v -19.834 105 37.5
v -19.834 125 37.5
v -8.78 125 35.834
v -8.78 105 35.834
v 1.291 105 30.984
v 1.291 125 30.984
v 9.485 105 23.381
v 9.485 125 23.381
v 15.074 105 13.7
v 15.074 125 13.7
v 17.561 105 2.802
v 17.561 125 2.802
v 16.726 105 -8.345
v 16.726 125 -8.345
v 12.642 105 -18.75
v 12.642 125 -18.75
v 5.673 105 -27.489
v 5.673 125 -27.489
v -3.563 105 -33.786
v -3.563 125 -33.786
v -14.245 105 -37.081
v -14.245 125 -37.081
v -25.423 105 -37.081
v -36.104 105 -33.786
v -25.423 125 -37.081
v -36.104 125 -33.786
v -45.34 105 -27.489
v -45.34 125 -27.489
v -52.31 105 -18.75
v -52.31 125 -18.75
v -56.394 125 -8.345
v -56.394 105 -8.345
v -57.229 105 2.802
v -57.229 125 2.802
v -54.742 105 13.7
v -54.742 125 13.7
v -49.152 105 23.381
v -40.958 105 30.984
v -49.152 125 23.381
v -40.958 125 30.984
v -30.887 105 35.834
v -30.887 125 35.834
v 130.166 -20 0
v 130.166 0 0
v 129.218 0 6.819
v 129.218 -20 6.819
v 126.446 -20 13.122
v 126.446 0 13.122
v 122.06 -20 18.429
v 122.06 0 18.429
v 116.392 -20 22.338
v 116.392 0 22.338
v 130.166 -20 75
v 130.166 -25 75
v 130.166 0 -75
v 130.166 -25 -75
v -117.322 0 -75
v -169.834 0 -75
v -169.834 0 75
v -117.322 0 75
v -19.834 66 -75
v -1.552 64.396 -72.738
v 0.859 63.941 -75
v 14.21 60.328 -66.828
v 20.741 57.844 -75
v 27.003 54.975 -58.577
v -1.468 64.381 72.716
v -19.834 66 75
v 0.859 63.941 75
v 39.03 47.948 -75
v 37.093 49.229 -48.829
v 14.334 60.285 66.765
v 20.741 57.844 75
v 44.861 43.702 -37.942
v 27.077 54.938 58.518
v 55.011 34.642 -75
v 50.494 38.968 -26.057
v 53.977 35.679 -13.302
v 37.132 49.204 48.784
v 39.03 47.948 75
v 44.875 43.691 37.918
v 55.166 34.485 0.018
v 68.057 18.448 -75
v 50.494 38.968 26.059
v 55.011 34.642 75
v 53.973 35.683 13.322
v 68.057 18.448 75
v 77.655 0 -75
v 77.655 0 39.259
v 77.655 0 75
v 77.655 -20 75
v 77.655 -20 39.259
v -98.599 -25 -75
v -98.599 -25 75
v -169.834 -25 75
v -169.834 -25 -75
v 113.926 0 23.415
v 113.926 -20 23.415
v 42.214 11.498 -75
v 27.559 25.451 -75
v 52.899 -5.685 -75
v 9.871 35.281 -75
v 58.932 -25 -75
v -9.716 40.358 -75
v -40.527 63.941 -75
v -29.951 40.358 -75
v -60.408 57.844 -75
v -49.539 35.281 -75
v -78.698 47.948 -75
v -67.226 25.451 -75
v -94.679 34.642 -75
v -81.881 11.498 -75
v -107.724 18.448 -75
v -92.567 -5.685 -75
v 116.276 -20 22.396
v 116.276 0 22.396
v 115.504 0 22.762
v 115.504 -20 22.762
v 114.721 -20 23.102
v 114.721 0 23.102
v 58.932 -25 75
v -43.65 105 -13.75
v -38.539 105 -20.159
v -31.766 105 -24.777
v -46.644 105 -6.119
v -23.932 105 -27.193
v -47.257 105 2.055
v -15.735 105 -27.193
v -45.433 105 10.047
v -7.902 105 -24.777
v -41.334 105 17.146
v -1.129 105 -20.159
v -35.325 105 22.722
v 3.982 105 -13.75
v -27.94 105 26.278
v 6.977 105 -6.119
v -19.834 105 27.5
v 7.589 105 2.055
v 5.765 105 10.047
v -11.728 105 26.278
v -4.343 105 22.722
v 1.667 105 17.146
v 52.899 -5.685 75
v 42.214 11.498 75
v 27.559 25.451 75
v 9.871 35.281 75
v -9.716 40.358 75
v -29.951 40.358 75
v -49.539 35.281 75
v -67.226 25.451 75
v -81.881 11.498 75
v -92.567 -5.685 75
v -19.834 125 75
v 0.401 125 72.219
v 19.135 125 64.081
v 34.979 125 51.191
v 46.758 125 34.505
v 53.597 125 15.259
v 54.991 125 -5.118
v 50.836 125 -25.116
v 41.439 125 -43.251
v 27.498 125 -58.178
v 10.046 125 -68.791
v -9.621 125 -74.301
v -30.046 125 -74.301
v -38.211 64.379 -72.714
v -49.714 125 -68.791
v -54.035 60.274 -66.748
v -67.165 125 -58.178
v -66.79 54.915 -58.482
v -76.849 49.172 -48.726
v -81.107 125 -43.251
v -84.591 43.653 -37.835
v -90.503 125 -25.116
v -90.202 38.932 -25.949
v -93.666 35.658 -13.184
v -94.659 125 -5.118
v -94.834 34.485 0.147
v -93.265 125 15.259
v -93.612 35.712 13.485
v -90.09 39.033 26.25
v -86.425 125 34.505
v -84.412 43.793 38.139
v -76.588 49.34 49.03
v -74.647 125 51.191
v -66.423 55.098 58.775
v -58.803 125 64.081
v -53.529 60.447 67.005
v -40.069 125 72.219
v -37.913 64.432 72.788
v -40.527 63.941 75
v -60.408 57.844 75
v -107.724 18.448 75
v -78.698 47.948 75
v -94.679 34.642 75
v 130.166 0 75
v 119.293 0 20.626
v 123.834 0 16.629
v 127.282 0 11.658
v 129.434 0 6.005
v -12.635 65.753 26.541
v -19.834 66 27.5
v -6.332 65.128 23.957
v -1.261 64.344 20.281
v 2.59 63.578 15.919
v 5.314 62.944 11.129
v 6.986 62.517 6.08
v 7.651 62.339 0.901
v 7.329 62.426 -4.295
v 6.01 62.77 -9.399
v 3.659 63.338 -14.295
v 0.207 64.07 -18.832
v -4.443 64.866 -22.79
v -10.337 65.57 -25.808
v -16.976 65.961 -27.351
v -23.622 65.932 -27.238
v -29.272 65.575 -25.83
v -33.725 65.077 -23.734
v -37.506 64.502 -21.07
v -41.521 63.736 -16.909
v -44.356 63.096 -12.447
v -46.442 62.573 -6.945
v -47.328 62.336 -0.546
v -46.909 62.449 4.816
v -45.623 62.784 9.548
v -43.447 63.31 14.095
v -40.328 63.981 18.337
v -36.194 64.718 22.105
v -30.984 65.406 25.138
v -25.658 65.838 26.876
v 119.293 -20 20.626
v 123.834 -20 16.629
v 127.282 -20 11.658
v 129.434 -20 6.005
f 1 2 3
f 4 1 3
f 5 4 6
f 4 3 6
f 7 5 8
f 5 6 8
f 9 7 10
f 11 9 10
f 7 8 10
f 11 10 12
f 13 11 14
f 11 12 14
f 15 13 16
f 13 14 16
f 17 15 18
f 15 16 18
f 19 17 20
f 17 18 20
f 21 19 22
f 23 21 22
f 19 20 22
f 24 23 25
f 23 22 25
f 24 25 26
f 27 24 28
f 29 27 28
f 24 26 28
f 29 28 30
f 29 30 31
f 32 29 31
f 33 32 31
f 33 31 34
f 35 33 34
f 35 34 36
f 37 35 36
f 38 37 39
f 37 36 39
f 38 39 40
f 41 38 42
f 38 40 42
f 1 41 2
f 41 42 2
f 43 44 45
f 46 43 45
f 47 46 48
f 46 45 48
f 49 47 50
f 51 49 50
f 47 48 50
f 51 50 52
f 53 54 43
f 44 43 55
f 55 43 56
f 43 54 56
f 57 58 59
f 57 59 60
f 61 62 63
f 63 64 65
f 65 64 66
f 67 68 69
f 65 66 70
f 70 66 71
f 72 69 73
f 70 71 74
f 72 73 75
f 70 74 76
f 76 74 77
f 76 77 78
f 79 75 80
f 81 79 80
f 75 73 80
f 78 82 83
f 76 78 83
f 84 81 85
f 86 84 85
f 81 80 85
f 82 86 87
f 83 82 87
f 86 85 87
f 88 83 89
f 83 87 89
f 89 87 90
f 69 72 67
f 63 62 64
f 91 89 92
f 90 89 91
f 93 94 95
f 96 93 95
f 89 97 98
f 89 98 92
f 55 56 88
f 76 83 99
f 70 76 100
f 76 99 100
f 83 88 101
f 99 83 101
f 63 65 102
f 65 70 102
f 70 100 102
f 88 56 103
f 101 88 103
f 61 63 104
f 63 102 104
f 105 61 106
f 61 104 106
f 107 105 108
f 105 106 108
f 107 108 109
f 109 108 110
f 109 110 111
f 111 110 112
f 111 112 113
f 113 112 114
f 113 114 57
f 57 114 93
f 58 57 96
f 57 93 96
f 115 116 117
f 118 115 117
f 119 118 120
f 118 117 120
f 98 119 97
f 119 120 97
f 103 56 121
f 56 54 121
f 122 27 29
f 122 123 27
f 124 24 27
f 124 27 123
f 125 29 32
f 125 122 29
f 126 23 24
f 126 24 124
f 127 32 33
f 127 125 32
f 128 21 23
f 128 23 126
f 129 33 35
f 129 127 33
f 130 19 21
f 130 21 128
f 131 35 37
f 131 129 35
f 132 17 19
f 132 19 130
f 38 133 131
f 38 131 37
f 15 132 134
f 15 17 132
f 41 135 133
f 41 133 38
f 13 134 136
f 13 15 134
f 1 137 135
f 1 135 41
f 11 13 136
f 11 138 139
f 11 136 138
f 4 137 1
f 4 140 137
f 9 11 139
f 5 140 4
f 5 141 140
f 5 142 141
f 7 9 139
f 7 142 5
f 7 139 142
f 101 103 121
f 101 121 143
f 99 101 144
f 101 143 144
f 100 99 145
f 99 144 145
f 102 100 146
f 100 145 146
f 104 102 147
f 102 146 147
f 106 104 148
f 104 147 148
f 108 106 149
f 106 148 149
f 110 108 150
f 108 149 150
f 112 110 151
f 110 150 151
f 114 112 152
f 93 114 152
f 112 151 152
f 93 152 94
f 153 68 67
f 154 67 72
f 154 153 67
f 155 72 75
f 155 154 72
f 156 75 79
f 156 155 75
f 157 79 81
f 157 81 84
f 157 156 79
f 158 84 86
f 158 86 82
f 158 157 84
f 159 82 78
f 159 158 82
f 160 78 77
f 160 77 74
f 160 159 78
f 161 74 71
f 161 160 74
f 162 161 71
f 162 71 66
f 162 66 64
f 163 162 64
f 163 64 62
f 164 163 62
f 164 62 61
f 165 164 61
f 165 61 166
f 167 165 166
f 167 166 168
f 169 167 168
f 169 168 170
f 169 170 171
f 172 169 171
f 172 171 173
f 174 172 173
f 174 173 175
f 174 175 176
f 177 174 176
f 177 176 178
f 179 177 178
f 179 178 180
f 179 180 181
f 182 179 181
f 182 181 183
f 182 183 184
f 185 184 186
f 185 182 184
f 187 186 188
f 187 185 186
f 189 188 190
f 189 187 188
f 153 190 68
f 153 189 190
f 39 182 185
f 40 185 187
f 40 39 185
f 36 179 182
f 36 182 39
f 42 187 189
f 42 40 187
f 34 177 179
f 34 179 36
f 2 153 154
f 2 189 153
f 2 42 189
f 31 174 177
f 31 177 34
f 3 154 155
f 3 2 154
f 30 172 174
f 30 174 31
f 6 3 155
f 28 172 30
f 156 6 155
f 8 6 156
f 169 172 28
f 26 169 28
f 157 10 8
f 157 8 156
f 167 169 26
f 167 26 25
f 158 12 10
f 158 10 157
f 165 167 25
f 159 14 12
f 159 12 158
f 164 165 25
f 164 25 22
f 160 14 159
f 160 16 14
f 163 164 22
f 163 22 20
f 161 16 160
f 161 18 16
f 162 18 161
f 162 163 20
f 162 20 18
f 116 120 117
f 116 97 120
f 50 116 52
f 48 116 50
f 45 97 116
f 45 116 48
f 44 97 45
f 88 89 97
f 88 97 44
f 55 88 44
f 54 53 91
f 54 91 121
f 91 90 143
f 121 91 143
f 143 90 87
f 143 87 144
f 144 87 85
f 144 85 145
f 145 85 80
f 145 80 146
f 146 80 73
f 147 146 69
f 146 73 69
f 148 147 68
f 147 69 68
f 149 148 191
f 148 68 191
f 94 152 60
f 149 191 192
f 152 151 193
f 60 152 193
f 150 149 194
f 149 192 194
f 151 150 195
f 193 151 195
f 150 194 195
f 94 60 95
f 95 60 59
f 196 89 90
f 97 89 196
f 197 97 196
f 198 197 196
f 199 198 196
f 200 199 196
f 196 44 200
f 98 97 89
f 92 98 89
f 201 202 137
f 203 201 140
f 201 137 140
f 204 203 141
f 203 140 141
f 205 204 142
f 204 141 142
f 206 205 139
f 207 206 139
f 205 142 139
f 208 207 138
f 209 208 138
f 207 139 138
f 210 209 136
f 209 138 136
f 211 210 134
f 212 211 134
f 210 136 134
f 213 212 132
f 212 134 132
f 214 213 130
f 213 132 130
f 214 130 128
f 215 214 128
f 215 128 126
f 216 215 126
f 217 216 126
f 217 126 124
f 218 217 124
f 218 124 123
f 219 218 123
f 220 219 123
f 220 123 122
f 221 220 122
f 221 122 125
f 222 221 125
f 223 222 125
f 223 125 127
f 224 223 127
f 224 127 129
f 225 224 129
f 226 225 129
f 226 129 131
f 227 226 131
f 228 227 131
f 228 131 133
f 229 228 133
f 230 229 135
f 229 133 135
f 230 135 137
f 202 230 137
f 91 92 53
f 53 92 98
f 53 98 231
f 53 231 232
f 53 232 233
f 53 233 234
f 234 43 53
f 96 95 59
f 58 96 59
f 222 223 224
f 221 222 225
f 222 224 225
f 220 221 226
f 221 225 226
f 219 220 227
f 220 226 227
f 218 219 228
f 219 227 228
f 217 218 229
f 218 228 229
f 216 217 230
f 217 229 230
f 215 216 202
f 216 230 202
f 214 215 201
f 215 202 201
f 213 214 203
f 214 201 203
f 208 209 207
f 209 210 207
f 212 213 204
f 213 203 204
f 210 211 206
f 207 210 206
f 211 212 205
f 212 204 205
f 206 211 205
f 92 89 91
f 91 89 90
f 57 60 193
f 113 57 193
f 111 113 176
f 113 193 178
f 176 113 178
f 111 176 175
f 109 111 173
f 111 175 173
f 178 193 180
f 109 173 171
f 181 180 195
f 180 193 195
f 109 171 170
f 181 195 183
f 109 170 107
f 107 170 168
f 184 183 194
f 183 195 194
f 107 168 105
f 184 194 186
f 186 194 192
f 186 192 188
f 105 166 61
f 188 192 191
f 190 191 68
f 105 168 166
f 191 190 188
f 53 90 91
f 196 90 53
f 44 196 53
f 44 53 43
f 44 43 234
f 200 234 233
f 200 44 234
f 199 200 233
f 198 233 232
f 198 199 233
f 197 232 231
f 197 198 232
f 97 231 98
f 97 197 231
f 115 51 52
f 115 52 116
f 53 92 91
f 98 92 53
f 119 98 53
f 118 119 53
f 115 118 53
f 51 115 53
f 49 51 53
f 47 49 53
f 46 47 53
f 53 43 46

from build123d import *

# Parameters (mm, degrees)
BOSS_EXTRUDE2_DEPTH      = 75
BOSS_EXTRUDE5_REACH      = 240.681
BOSS_EXTRUDE5_END_RADIUS = 105
SKETCH2_R                = 75
SKETCH2_R_2              = 37.5
BOSS_EXTRUDE6_REACH      = 240.681
BOSS_EXTRUDE6_END_RADIUS = 105
SKETCH2_10_R             = 37.5
SKETCH2_10_R_2           = 27.5
SKETCH2_11_R             = 37.5
SKETCH2_11_R_2           = 27.5
CUT_EXTRUDE1_DEPTH       = 20
CUT_EXTRUDE5_DEPTH       = 20
BOSS_EXTRUDE7_DEPTH      = 20
BOSS_EXTRUDE8_DEPTH      = 20


with BuildPart() as part:
    # Sketch1 → Boss-Extrude2 (new, symmetric)
    with BuildSketch(Plane.XY):
        with BuildLine():
            Line((-169.833817009, 0), (-117.322277864, 0))
            ThreePointArc((-117.322277864, 0), (-19.833817009, 66), (77.654643847, 0))
            Line((77.654643847, 0), (130.166182991, 0))
            Line((130.166182991, 0), (130.166182991, -25))
            Line((130.166182991, -25), (58.931657662, -25))
            ThreePointArc((58.931657662, -25), (-19.833817009, 41), (-98.599291679, -25))
            Line((-98.599291679, -25), (-169.833817009, -25))
            Line((-169.833817009, -25), (-169.833817009, 0))
        make_face()
    extrude(amount=BOSS_EXTRUDE2_DEPTH, both=True)

    # Boss-Extrude5: up to this cylinder (the profile starts outside it)
    boss_extrude5_end = Plane(origin=(-19.833817009, -39, -72.87868), z_dir=(0, 0, -1)) * Cylinder(BOSS_EXTRUDE5_END_RADIUS, 692.362, mode=Mode.PRIVATE)
    # Sketch2 → Boss-Extrude5 (add, up to the surface)
    with BuildSketch(Plane(origin=(0, 125, 0), x_dir=(1, 0, 0), z_dir=(0, 1, 0)), mode=Mode.PRIVATE) as boss_extrude5_sk1:
        with Locations(Location((-19.833817009, 0, 0), (0, 0, 270))):
            Circle(SKETCH2_R)
        with Locations(Location((-19.833817009, 0, 0), (0, 0, 270))):
            Circle(SKETCH2_R_2, mode=Mode.SUBTRACT)
    boss_extrude5_tool1 = extrude(boss_extrude5_sk1.sketch, amount=-BOSS_EXTRUDE5_REACH, mode=Mode.PRIVATE) - boss_extrude5_end
    add(boss_extrude5_tool1.solids().sort_by_distance((-19.833817, 125, -72.87868))[0])

    # Boss-Extrude6: up to this cylinder (the profile starts outside it)
    boss_extrude6_end = Plane(origin=(-19.833817009, -39, 0), z_dir=(0, 0, -1)) * Cylinder(BOSS_EXTRUDE6_END_RADIUS, 692.362, mode=Mode.PRIVATE)
    # Sketch2<10> → Boss-Extrude6 (add, up to the surface)
    with BuildSketch(Plane(origin=(0, 125, 0), x_dir=(1, 0, 0), z_dir=(0, 1, 0)), mode=Mode.PRIVATE) as boss_extrude6_sk1:
        with Locations((-19.833817009, 0)):
            Circle(SKETCH2_10_R)
        with Locations(Location((-19.833817009, 0, 0), (0, 0, 270))):
            Circle(SKETCH2_10_R_2, mode=Mode.SUBTRACT)
    boss_extrude6_tool1 = extrude(boss_extrude6_sk1.sketch, amount=-BOSS_EXTRUDE6_REACH, mode=Mode.PRIVATE) - boss_extrude6_end
    add(boss_extrude6_tool1.solids().sort_by_distance((-56.273157, 125, 0))[0])

    # Sketch2<11> → Cut-Extrude1 (cut)
    with BuildSketch(Plane(origin=(0, 125, 0), x_dir=(1, 0, 0), z_dir=(0, 1, 0))):
        with Locations(Location((-19.833817009, 0, 0), (0, 0, 270))):
            Circle(SKETCH2_11_R)
        with Locations(Location((-19.833817009, 0, 0), (0, 0, 270))):
            Circle(SKETCH2_11_R_2, mode=Mode.SUBTRACT)
    extrude(amount=-CUT_EXTRUDE1_DEPTH, mode=Mode.SUBTRACT)

    # Sketch3 → Cut-Extrude5 (cut)
    with BuildSketch(Plane(origin=(0, 0, 0), x_dir=(1, 0, 0), z_dir=(0, 1, 0))):
        with BuildLine():
            Line((77.654643847, -75), (130.166182991, -75))
            Line((130.166182991, -75), (130.166182991, 0))
            ThreePointArc((130.166182991, 0), (126.445873921, -13.121537789), (116.392202675, -22.337781494))
            Line((116.392202675, -22.337781494), (116.276169616, -22.395718278))
            ThreePointArc((116.276169616, -22.395718278), (115.113974639, -22.935593329), (113.925642242, -23.415206034))
            Line((113.925642242, -23.415206034), (77.654643847, -39.258833162))
            Line((77.654643847, -39.258833162), (77.654643847, -75))
        make_face()
        with BuildLine():
            ThreePointArc((113.873176653, 23.434766083), (125.692688314, 14.271039879), (130.166182991, 0))
            Line((130.166182991, 0), (130.166182991, 75))
            Line((130.166182991, 75), (77.654643847, 75))
            Line((77.654643847, 75), (77.654643847, 39.207200347))
            Line((77.654643847, 39.207200347), (113.873176653, 23.434766083))
        make_face()
    extrude(amount=-CUT_EXTRUDE5_DEPTH, mode=Mode.SUBTRACT)

    # Sketch4 → Boss-Extrude7 (add)
    with BuildSketch(Plane(origin=(0, -20, 0), x_dir=(1, 0, 0), z_dir=(0, 1, 0))):
        with BuildLine():
            Line((77.654643847, 75), (77.654643847, 39.207200347))
            Line((77.654643847, 39.207200347), (113.873176653, 23.434766083))
            ThreePointArc((113.873176653, 23.434766083), (125.341873235, 14.027135917), (130.166182991, 0))
            Line((130.166182991, 0), (130.166182991, 75))
            Line((130.166182991, 75), (77.654643847, 75))
        make_face()
    extrude(amount=BOSS_EXTRUDE7_DEPTH)


with BuildPart() as body_2:
    # Sketch5 → Boss-Extrude8 (new body)
    with BuildSketch(Plane(origin=(0, 0, 0), x_dir=(1, 0, 0), z_dir=(0, 1, 0))):
        with BuildLine():
            Line((77.654643847, -39.258833162), (77.654643847, -75))
            Line((77.654643847, -75), (130.166182991, -75))
            Line((130.166182991, -75), (130.166182991, 0))
            ThreePointArc((130.166182991, 0), (125.708657055, -14.248044054), (113.925642242, -23.415206034))
            Line((113.925642242, -23.415206034), (77.654643847, -39.258833162))
        make_face()
    extrude(amount=-BOSS_EXTRUDE8_DEPTH)


solid = Compound([part.part, body_2.part])
